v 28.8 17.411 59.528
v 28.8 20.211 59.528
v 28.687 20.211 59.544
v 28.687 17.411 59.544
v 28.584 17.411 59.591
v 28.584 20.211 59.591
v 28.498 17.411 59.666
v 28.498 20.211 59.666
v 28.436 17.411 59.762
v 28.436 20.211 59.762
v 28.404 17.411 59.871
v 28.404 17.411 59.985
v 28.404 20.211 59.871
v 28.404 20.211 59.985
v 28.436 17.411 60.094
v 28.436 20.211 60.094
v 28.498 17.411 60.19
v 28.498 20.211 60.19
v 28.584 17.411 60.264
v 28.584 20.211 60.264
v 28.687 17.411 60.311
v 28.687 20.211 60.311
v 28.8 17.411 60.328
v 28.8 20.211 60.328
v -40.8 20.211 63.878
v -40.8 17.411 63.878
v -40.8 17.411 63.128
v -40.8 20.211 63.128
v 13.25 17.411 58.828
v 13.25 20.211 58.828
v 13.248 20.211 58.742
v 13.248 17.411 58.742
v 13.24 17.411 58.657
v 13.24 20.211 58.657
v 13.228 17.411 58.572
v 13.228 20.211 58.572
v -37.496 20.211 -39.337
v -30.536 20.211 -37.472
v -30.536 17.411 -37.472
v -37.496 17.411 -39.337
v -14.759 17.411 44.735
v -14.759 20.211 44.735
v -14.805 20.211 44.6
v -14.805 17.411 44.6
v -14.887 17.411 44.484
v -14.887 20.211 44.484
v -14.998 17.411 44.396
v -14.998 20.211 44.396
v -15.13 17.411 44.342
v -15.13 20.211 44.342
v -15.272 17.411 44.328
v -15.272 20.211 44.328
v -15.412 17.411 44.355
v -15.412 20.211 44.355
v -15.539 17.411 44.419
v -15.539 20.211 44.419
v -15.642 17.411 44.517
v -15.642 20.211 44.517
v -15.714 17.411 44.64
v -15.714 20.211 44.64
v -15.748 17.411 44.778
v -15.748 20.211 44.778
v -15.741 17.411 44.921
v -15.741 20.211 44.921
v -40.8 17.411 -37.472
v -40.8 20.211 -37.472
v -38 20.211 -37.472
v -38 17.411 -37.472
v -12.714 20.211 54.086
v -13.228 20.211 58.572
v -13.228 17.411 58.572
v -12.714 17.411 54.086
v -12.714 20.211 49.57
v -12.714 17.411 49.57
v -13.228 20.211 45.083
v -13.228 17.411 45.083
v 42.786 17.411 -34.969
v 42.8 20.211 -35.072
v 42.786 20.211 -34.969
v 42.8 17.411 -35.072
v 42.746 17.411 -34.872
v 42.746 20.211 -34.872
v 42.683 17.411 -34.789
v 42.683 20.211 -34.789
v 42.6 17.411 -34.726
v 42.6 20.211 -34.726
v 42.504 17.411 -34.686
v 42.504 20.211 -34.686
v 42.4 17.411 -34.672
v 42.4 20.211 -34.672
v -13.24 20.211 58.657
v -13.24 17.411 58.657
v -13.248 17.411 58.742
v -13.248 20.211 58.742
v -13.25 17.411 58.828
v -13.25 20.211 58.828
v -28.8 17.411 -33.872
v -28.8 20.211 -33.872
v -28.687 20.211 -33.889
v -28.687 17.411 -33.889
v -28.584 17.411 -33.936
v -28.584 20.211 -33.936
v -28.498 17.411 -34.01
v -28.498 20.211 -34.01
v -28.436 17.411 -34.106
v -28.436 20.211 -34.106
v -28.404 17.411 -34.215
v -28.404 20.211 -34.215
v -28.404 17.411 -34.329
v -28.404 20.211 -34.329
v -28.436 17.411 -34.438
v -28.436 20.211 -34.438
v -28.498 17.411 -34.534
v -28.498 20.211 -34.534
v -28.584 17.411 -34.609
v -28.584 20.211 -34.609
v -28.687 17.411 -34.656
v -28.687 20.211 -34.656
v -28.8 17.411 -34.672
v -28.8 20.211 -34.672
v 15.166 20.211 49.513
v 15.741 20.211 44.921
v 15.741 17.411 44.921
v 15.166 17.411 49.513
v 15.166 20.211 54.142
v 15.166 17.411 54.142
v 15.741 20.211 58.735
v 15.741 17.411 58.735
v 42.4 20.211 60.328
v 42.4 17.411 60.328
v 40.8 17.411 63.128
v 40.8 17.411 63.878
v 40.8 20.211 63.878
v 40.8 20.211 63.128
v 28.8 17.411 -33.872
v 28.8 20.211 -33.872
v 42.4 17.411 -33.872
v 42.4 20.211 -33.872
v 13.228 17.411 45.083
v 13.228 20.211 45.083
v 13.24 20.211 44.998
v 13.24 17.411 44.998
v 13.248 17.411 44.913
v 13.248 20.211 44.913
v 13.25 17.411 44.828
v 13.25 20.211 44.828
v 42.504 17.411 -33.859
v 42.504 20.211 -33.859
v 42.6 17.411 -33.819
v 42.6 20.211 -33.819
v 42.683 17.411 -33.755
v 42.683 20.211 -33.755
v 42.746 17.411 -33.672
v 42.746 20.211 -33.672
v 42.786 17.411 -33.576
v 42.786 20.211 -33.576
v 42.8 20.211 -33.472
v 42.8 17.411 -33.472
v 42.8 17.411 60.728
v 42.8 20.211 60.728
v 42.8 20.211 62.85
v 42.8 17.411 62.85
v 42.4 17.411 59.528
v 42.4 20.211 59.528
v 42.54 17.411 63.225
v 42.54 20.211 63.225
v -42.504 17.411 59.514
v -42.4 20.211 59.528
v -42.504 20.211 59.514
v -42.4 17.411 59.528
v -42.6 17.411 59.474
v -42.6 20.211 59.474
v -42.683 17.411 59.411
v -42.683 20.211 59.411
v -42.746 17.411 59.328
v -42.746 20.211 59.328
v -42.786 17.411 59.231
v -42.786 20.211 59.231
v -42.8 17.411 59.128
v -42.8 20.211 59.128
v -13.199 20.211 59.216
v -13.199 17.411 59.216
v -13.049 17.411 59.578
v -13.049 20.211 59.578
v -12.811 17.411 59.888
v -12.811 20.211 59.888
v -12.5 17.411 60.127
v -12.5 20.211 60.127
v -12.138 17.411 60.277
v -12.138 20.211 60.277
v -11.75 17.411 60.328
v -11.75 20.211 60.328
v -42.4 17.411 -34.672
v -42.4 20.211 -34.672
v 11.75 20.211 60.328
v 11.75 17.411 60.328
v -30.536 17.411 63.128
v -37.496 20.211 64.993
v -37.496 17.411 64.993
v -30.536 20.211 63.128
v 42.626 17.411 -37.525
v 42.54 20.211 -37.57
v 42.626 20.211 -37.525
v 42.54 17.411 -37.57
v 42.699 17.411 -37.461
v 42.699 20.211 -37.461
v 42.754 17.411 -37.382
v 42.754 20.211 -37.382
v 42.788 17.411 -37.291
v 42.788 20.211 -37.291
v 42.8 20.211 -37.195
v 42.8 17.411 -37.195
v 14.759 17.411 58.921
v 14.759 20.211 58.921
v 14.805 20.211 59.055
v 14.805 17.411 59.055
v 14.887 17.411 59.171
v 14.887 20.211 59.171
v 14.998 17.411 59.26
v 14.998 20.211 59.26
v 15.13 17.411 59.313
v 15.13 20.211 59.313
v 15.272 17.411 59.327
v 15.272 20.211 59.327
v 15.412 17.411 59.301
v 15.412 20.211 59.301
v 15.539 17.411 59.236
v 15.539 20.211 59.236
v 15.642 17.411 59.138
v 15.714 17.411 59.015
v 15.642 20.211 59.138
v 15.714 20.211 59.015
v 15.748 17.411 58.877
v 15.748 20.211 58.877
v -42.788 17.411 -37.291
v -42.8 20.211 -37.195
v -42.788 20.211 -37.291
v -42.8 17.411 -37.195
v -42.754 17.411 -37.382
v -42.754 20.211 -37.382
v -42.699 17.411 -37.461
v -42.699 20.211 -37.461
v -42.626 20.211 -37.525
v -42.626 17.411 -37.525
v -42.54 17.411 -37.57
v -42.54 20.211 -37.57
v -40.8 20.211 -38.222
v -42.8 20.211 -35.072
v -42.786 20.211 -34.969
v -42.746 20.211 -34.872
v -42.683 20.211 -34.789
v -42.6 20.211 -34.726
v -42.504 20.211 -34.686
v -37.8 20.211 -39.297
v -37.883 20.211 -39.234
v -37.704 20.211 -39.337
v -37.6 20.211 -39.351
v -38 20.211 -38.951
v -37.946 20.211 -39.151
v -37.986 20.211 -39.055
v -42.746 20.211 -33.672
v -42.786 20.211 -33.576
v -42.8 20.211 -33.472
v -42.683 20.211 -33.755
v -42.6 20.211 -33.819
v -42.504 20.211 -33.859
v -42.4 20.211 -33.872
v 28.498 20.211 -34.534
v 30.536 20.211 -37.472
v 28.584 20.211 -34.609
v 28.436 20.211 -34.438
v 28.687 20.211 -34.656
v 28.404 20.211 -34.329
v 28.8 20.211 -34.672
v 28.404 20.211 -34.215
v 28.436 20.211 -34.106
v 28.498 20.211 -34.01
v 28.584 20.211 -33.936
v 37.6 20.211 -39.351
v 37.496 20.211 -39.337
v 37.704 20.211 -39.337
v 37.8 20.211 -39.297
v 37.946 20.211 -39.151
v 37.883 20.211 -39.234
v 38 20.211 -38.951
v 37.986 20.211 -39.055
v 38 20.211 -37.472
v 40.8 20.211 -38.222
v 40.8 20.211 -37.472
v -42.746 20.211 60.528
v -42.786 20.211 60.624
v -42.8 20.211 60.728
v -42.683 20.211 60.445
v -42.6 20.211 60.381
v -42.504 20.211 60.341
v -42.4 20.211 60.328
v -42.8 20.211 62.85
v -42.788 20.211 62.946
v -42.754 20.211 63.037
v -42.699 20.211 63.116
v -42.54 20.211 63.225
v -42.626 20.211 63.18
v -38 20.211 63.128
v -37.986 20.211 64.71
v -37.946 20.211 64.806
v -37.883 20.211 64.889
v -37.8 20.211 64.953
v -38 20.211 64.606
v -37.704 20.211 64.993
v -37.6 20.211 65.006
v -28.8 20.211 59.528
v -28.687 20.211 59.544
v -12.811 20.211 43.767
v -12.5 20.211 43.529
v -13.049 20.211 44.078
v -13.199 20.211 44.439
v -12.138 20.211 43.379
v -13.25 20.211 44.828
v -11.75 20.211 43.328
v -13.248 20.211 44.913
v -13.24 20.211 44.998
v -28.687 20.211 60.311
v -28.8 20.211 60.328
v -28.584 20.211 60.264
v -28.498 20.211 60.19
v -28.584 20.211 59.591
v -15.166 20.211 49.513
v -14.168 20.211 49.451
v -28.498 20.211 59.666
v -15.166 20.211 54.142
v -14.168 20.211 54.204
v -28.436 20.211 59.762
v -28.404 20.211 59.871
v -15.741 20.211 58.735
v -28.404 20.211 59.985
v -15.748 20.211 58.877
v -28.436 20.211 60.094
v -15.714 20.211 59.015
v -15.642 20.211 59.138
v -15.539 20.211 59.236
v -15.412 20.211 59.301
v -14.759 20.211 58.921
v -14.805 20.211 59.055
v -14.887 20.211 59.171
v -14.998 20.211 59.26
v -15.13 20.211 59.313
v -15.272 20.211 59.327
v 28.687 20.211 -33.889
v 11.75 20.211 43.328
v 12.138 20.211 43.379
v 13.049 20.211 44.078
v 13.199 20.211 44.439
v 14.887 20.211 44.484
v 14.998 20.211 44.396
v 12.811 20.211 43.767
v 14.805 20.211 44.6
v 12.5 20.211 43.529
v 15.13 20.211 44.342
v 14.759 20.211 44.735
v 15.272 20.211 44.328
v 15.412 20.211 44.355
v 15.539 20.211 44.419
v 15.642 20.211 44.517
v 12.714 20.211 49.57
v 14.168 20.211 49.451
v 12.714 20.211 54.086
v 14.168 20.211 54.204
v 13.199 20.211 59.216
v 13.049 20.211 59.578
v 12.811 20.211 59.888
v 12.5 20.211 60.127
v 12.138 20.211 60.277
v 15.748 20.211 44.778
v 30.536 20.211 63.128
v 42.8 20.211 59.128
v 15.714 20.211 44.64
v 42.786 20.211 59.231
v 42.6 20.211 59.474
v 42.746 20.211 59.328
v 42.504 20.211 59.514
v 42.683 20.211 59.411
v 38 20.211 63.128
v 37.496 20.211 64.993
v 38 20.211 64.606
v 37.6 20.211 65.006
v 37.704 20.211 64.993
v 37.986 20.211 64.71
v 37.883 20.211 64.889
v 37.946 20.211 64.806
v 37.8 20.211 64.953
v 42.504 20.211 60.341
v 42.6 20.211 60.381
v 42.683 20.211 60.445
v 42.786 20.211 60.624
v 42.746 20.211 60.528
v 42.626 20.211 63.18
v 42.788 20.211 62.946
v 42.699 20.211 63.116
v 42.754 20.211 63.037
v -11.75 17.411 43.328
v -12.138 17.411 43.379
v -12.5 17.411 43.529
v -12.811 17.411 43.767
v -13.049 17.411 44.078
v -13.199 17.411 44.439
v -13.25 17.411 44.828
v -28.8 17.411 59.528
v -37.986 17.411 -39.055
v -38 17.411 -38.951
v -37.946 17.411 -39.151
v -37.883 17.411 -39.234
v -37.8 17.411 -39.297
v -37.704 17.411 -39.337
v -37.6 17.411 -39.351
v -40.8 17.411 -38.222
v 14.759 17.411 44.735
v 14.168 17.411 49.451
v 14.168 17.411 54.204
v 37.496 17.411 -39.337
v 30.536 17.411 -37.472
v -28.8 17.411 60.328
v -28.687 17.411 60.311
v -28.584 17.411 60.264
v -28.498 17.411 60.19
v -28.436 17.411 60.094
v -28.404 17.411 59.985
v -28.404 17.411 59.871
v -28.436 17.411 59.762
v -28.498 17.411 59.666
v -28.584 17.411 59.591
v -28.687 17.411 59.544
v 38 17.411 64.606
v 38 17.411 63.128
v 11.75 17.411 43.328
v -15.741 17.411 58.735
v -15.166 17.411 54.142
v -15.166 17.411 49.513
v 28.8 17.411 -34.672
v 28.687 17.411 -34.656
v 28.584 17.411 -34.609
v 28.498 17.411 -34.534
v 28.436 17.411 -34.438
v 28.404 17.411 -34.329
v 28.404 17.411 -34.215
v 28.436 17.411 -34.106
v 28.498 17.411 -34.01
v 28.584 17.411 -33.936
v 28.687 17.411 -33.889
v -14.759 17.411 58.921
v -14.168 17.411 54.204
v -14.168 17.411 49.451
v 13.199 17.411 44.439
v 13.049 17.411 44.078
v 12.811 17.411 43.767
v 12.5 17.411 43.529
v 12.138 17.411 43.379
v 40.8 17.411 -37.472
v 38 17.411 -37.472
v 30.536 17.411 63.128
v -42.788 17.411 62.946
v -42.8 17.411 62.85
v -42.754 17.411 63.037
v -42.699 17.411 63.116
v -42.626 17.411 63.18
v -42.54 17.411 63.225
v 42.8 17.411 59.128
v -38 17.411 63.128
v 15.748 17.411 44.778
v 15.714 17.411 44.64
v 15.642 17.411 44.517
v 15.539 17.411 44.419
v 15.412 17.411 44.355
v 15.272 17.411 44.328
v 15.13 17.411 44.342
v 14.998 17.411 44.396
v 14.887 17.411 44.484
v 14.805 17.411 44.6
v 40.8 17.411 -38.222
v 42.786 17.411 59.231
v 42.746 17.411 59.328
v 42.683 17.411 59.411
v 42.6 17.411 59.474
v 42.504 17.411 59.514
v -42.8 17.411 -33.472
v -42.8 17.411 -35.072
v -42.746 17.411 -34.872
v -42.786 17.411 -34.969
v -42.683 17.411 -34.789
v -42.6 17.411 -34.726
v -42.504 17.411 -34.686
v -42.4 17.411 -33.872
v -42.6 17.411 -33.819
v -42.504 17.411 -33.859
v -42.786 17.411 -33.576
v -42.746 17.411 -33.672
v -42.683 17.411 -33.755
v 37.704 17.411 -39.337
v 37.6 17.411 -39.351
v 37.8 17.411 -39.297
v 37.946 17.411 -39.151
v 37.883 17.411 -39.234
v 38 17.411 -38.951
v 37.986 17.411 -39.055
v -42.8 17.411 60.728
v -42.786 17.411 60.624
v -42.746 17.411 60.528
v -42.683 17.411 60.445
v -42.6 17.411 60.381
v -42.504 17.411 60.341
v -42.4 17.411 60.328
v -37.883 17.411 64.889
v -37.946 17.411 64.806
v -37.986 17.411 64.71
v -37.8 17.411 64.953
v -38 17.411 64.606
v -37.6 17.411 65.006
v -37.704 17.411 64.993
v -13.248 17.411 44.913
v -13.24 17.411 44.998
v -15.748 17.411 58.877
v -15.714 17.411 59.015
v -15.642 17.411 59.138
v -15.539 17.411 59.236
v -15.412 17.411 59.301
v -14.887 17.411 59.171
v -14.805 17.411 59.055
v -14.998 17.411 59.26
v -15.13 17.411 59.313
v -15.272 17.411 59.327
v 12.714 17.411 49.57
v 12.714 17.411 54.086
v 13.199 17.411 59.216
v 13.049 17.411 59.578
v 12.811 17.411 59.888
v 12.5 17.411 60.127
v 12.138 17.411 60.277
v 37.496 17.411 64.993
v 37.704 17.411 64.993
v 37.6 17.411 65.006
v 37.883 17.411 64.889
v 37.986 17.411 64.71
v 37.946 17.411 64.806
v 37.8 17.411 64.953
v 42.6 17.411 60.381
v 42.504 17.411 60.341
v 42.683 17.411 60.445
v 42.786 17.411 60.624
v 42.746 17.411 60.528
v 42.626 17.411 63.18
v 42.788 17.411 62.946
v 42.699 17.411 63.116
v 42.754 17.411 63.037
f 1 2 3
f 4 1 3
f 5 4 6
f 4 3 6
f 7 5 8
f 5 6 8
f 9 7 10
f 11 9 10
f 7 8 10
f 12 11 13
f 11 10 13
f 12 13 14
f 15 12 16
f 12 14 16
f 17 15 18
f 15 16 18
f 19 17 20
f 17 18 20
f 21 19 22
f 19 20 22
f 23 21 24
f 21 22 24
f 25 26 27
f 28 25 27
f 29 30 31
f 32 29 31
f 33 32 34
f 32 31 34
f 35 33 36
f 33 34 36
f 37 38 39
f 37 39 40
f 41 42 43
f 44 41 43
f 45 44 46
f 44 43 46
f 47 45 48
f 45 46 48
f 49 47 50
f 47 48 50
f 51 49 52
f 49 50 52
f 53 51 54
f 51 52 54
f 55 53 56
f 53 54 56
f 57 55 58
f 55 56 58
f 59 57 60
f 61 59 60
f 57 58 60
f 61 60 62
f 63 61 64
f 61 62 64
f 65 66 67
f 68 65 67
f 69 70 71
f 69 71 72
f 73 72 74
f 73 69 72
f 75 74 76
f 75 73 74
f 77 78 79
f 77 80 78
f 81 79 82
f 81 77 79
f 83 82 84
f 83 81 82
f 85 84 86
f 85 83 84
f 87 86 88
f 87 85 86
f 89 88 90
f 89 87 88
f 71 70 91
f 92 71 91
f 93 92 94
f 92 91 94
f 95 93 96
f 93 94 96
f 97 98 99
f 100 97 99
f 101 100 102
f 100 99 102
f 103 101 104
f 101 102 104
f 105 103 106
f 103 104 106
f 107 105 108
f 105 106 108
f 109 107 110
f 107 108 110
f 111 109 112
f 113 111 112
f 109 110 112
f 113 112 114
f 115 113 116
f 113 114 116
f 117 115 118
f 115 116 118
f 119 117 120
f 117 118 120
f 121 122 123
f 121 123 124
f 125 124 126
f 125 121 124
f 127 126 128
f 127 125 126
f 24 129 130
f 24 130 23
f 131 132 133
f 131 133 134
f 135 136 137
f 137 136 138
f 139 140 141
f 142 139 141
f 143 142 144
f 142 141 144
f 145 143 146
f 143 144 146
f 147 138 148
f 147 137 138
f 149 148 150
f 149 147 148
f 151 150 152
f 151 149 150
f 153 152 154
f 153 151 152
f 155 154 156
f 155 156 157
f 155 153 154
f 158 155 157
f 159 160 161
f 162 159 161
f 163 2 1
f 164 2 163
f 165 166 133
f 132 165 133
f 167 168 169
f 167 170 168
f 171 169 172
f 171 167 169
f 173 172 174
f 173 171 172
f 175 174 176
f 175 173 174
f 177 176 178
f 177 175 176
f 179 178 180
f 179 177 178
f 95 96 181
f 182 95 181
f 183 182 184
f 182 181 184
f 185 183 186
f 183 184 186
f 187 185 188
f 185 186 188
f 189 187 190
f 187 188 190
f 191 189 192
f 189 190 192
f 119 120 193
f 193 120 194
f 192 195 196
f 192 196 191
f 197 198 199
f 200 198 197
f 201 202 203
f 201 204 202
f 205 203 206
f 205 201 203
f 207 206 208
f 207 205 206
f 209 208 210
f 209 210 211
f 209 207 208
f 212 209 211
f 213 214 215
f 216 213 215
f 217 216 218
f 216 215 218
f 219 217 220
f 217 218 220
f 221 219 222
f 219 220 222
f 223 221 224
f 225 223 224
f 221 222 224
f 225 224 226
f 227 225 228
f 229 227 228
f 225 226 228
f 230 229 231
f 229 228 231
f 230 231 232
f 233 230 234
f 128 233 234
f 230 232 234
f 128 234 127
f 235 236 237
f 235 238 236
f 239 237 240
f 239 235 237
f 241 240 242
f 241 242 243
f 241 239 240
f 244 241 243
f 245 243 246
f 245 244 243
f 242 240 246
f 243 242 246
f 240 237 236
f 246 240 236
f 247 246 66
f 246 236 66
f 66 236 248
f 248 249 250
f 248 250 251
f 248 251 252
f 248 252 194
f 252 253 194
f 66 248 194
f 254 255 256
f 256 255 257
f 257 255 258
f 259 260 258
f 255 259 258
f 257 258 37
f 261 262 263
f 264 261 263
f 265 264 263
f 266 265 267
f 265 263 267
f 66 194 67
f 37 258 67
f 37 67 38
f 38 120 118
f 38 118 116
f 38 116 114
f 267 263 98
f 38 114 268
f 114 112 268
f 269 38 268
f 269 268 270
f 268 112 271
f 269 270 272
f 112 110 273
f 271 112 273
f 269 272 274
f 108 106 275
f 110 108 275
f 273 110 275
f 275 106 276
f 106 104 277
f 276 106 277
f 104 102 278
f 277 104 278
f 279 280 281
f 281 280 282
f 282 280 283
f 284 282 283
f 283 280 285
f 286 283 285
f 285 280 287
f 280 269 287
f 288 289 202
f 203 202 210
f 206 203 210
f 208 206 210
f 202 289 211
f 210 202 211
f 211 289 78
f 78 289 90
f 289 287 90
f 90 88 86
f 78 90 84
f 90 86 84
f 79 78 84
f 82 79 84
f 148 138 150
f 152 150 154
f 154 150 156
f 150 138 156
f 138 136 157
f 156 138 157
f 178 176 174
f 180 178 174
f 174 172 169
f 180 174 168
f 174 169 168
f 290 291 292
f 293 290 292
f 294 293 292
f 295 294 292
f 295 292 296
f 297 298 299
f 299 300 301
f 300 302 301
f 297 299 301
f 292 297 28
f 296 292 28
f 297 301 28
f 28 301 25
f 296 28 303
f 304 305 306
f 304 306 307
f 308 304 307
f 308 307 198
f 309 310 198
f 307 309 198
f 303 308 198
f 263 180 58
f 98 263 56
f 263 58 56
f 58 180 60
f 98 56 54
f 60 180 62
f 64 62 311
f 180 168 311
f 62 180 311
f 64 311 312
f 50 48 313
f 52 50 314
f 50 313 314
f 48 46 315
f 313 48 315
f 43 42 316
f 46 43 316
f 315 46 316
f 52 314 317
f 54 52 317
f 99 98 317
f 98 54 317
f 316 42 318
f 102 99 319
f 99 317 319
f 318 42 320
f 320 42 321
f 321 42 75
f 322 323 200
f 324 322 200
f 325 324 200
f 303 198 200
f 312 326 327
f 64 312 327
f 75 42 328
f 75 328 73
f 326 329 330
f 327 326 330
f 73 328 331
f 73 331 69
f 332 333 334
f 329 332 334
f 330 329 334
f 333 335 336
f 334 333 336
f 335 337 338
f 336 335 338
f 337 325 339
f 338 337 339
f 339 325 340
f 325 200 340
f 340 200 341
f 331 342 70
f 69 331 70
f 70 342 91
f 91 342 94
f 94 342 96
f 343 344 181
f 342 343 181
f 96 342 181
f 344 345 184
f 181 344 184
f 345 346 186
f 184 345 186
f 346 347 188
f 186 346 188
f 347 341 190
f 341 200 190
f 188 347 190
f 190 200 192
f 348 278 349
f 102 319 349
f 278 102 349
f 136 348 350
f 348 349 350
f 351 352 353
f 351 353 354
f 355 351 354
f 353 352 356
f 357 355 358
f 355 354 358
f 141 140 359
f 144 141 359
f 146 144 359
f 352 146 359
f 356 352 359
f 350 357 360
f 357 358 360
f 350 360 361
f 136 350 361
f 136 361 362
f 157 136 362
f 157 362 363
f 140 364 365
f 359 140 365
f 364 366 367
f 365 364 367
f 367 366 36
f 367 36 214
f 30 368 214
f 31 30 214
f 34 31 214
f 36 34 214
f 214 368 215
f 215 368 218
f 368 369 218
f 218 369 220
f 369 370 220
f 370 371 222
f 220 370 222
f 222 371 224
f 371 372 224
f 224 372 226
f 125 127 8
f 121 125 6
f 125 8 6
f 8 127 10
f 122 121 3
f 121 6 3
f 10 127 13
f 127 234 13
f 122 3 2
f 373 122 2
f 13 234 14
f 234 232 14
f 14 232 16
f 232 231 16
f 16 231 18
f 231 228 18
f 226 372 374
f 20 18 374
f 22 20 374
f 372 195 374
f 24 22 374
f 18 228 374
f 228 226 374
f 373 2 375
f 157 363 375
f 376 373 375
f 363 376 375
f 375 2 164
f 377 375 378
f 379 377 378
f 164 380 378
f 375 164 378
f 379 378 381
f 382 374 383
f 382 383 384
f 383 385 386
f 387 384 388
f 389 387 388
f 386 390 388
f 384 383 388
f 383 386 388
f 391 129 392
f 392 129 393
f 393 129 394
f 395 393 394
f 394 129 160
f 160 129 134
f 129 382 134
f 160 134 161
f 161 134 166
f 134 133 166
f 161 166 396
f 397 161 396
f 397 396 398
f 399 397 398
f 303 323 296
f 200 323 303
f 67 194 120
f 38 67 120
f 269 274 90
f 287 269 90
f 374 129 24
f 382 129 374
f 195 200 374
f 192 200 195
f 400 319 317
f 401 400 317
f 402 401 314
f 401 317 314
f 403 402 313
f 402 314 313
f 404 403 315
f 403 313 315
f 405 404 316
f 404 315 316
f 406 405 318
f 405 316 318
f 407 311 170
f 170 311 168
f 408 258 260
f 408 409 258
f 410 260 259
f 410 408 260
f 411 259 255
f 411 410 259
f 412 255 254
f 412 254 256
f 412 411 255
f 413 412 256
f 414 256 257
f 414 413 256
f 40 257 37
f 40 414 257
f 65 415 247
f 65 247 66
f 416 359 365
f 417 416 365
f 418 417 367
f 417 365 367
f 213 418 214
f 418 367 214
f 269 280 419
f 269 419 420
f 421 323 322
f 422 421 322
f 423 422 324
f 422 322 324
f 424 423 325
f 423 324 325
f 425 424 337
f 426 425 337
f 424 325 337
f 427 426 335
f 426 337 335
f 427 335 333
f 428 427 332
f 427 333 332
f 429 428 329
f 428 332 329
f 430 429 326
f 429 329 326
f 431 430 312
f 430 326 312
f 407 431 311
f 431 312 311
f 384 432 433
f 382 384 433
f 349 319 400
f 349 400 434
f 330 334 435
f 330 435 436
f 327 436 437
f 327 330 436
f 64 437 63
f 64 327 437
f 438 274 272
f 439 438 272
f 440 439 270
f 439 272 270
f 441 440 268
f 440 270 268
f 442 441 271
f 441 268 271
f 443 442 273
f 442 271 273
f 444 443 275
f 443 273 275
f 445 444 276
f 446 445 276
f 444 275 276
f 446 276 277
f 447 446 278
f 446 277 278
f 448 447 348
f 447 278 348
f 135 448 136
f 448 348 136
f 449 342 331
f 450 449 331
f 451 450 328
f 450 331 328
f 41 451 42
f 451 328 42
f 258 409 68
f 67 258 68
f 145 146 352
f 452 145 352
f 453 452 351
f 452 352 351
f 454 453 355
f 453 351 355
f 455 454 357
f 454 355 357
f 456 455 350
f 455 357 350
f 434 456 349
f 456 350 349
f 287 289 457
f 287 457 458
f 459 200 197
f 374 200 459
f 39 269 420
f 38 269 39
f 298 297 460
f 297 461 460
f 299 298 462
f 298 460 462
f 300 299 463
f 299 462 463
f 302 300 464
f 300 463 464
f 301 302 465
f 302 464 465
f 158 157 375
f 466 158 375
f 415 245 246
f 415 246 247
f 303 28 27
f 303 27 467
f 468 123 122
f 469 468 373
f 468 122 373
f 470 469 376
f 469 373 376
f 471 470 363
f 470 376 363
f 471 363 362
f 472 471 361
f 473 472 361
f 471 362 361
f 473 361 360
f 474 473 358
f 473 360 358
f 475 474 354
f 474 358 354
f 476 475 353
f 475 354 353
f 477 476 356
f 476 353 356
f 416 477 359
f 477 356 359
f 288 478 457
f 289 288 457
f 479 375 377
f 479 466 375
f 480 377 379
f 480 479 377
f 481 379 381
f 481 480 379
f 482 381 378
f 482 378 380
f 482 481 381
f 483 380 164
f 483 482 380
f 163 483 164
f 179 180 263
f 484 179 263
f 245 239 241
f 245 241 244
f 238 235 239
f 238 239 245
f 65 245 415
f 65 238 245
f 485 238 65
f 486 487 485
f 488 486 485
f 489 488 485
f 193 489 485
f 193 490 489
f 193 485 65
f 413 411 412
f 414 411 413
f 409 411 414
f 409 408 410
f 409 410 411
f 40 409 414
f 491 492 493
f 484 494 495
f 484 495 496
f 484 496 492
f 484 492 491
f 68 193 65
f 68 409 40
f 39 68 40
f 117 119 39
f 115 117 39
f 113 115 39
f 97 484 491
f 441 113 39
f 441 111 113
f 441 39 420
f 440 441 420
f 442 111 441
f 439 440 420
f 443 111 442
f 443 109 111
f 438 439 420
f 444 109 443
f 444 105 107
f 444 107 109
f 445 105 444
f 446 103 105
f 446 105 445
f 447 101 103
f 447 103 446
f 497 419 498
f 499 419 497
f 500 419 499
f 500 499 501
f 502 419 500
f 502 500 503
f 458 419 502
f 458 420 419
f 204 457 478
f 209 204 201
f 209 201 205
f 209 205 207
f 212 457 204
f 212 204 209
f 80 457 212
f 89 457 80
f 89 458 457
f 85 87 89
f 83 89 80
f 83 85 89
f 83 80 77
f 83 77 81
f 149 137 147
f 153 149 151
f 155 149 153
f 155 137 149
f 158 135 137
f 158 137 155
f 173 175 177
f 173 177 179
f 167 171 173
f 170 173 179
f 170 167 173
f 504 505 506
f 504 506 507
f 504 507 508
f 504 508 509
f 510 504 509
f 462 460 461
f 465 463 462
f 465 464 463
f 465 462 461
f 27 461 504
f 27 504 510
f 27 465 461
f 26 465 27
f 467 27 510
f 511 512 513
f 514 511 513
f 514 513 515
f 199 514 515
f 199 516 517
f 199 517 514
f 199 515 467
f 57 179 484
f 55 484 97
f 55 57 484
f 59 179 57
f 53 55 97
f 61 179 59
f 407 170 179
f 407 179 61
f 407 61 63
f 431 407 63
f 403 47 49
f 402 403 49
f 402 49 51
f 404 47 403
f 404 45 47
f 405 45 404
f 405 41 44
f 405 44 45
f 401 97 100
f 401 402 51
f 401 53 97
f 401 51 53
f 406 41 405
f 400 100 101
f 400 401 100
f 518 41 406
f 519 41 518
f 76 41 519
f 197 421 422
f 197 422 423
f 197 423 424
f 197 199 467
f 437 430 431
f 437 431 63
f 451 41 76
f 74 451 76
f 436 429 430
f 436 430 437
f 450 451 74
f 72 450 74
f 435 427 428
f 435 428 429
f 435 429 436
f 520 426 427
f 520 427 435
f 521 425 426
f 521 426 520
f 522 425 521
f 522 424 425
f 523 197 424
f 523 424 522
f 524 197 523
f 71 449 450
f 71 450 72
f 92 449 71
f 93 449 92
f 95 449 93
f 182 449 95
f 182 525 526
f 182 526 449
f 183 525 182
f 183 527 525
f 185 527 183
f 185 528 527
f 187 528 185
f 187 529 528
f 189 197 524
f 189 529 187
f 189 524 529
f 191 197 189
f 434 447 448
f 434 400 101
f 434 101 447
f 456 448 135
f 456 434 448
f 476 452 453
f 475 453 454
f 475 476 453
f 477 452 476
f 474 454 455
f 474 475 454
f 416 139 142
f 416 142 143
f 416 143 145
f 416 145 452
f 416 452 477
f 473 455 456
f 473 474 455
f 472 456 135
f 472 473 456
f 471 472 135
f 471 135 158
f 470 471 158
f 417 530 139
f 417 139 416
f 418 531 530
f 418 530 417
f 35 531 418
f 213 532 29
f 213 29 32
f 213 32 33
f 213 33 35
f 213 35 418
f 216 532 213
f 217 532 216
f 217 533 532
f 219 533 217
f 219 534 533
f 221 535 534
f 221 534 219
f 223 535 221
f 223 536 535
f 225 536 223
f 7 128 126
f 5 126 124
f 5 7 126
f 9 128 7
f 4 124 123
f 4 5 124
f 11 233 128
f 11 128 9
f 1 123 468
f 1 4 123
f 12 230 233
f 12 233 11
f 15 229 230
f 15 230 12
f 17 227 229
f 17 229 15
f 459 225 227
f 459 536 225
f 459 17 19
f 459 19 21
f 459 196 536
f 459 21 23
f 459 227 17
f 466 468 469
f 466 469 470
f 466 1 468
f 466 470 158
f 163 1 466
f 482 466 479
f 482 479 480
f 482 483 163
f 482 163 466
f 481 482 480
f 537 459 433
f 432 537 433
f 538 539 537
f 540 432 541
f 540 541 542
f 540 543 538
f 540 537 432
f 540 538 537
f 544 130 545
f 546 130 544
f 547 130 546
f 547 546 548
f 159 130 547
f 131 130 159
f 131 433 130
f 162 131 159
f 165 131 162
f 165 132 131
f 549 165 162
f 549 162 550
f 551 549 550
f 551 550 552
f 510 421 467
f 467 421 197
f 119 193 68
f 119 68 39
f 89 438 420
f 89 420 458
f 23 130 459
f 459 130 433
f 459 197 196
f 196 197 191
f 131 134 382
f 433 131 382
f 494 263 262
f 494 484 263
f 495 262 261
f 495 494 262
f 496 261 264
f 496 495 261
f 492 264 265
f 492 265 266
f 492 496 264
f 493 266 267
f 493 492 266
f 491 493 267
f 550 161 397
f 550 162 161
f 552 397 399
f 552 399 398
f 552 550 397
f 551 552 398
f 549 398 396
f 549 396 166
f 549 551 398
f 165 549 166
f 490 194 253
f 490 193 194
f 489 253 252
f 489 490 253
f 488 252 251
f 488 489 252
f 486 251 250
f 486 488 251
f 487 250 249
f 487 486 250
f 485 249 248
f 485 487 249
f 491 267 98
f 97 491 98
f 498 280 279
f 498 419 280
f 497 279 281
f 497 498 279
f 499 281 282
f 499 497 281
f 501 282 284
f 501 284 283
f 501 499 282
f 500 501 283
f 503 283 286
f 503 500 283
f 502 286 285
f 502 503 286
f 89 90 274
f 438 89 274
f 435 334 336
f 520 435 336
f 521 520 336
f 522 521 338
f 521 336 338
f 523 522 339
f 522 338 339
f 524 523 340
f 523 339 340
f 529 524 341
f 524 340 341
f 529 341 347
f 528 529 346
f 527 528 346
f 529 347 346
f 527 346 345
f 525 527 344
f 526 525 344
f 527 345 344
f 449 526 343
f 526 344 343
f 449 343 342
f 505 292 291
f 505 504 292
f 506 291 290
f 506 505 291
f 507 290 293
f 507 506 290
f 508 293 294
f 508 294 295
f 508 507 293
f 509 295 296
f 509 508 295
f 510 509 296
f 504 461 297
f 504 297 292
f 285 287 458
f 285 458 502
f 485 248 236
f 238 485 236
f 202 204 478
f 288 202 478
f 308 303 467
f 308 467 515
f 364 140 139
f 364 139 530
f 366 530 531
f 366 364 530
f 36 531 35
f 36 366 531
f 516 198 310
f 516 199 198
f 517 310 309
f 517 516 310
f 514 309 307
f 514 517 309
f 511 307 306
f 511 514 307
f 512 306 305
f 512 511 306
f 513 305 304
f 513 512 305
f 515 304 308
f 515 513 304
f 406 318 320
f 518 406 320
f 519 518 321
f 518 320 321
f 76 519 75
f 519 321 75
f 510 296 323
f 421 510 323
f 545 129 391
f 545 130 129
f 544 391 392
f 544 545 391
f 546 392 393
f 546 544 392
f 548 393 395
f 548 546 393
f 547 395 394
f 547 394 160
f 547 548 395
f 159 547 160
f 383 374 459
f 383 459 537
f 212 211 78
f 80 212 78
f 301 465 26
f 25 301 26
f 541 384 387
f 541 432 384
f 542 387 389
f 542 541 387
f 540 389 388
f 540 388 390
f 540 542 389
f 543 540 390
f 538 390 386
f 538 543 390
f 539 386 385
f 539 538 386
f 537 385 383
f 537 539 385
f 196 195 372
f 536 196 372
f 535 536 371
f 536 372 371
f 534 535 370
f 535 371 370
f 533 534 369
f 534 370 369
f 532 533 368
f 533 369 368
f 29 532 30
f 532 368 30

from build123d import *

# Parameters (mm, degrees)
PAD008_DEPTH    = 2.8
FILLET001_R     = 0.4
POCKET004_DEPTH = 2.801


with BuildPart() as part:
    # Sketch008 (on Face4 of ShapeBinder007) → Pad008 (new body)
    with BuildSketch(Plane(origin=(0, 20.211282, 0), x_dir=(-1, 0, 0), z_dir=(0, 1, 0))):
        with BuildLine():
            Line((42.8, 63.127675), (42.8, 60.327675))
            Line((42.8, 60.327675), (28.8, 60.327675))
            ThreePointArc((28.8, 60.327675), (28.4, 59.927675), (28.8, 59.527675))
            Line((28.8, 59.527675), (42.8, 59.527675))
            Line((42.8, 59.527675), (42.8, -33.872325))
            Line((42.8, -33.872325), (28.8, -33.872325))
            ThreePointArc((28.8, -33.872325), (28.4, -34.272325), (28.8, -34.672325))
            Line((28.8, -34.672325), (42.8, -34.672325))
            Line((42.8, -34.672325), (42.8, -37.472325))
            Line((42.8, -37.472325), (40.8, -38.222325))
            Line((40.8, -38.222325), (40.8, -37.472325))
            Line((40.8, -37.472325), (38, -37.472325))
            Line((38, -39.472325), (38, -37.472325))
            Line((30.535898, -37.472325), (38, -39.472325))
            Line((-30.535898, -37.472325), (30.535898, -37.472325))
            Line((-38, -39.472325), (-30.535898, -37.472325))
            Line((-38, -37.472325), (-38, -39.472325))
            Line((-40.8, -37.472325), (-38, -37.472325))
            Line((-40.8, -38.222325), (-40.8, -37.472325))
            Line((-42.8, -37.472325), (-40.8, -38.222325))
            Line((-42.8, -37.472325), (-42.8, -34.672325))
            Line((-42.8, -34.672325), (-28.8, -34.672325))
            ThreePointArc((-28.8, -34.672325), (-28.4, -34.272325), (-28.8, -33.872325))
            Line((-28.8, -33.872325), (-42.8, -33.872325))
            Line((-42.8, -33.872325), (-42.8, 59.527675))
            Line((-28.8, 59.527675), (-42.8, 59.527675))
            ThreePointArc((-28.8, 59.527675), (-28.4, 59.927675), (-28.8, 60.327675))
            Line((-42.8, 60.327675), (-28.8, 60.327675))
            Line((-42.8, 60.327675), (-42.8, 63.127675))
            Line((-42.8, 63.127675), (-40.8, 63.877675))
            Line((-40.8, 63.877675), (-40.8, 63.127675))
            Line((-40.8, 63.127675), (-38, 63.127675))
            Line((-38, 65.127675), (-38, 63.127675))
            Line((-30.535898, 63.127675), (-38, 65.127675))
            Line((30.535898, 63.127675), (-30.535898, 63.127675))
            Line((38, 65.127675), (30.535898, 63.127675))
            Line((38, 63.127675), (38, 65.127675))
            Line((40.8, 63.127675), (38, 63.127675))
            Line((40.8, 63.877675), (40.8, 63.127675))
            Line((42.8, 63.127675), (40.8, 63.877675))
        make_face()
    extrude(amount=-PAD008_DEPTH)

    # Fillet001
    fillet001_edges = [part.edges().sort_by_distance(p)[0] for p in [
        (-38, 18.811282, -39.472325),
        (-42.8, 18.811282, -37.472325),
        (-42.8, 18.811282, -34.672325),
        (-42.8, 18.811282, -33.872325),
        (-42.8, 18.811282, 59.527675),
        (-42.8, 18.811282, 60.327675),
        (-42.8, 18.811282, 63.127675),
        (-38, 18.811282, 65.127675),
        (42.8, 18.811282, 59.527675),
        (42.8, 18.811282, 60.327675),
        (42.8, 18.811282, 63.127675),
        (38, 18.811282, 65.127675),
        (42.8, 18.811282, -33.872325),
        (42.8, 18.811282, -34.672325),
        (42.8, 18.811282, -37.472325),
        (38, 18.811282, -39.472325),
    ]]
    fillet(fillet001_edges, radius=FILLET001_R)

    # Sketch017 (on Face2 of Fillet001) → Pocket004 (cut, through all)
    with BuildSketch(Plane(origin=(0, 20.211282, 0), x_dir=(-1, 0, 0), z_dir=(0, 1, 0))):
        with BuildLine():
            ThreePointArc((-11.75, 60.327675), (-12.81066, 59.888335), (-13.25, 58.827675))
            ThreePointArc((-13.25, 58.827675), (-13.24452, 58.699573), (-13.22812, 58.572408))
            ThreePointArc((-13.22812, 45.082943), (-12.65, 51.827675), (-13.22812, 58.572408))
            ThreePointArc((-13.22812, 45.082943), (-13.24452, 44.955777), (-13.25, 44.827675))
            ThreePointArc((-13.25, 44.827675), (-12.81066, 43.767015), (-11.75, 43.327675))
            Line((11.75, 43.327675), (-11.75, 43.327675))
            ThreePointArc((11.75, 43.327675), (12.81066, 43.767015), (13.25, 44.827675))
            ThreePointArc((13.25, 44.827675), (13.24452, 44.955777), (13.22812, 45.082943))
            ThreePointArc((13.22812, 58.572408), (12.65, 51.827675), (13.22812, 45.082943))
            ThreePointArc((13.22812, 58.572408), (13.24452, 58.699573), (13.25, 58.827675))
            ThreePointArc((13.25, 58.827675), (12.81066, 59.888335), (11.75, 60.327675))
            Line((-11.75, 60.327675), (11.75, 60.327675))
        make_face()
        with BuildLine():
            ThreePointArc((-14.7587, 44.73481), (-14.09424, 51.827675), (-14.7587, 58.92054))
            ThreePointArc((-14.7587, 58.92054), (-15.342865, 59.318975), (-15.7413, 58.73481))
            ThreePointArc((-15.7413, 44.92054), (-15.09424, 51.827675), (-15.7413, 58.73481))
            ThreePointArc((-15.7413, 44.92054), (-15.342865, 44.336375), (-14.7587, 44.73481))
        make_face()
        with BuildLine():
            ThreePointArc((14.7587, 58.92054), (14.09424, 51.827675), (14.7587, 44.73481))
            ThreePointArc((14.7587, 44.73481), (15.342865, 44.336375), (15.7413, 44.92054))
            ThreePointArc((15.7413, 58.73481), (15.09424, 51.827675), (15.7413, 44.92054))
            ThreePointArc((15.7413, 58.73481), (15.342865, 59.318975), (14.7587, 58.92054))
        make_face()
    extrude(amount=-POCKET004_DEPTH, mode=Mode.SUBTRACT)


solid = part.part
